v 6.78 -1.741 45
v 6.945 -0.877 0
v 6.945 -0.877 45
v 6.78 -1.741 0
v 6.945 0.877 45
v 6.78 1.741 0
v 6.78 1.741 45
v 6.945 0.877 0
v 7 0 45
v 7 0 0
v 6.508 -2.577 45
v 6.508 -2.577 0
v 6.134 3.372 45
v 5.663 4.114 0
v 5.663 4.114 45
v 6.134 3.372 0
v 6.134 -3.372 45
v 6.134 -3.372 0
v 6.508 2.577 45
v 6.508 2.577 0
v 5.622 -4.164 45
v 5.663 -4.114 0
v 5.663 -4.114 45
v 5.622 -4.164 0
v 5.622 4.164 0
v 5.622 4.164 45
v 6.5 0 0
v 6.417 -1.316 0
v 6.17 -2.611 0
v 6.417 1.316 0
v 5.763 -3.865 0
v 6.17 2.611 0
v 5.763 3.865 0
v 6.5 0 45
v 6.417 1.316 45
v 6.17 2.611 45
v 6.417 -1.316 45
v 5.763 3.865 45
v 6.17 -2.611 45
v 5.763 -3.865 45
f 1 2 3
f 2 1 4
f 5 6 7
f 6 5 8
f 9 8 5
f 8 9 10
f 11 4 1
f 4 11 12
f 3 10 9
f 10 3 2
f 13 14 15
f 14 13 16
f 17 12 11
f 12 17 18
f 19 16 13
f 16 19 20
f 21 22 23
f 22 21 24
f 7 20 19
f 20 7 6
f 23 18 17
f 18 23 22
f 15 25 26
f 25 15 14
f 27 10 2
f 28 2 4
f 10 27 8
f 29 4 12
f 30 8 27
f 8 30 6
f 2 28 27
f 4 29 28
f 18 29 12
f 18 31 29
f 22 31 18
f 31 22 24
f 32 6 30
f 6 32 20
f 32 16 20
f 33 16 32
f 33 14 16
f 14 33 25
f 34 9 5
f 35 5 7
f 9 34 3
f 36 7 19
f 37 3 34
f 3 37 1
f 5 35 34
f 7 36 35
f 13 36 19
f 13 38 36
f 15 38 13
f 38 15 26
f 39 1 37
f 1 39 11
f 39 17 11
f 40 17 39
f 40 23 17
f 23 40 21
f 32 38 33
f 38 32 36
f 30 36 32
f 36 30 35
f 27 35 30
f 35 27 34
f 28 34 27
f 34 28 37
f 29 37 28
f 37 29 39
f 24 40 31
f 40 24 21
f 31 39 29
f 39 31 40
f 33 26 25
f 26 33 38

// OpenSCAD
$fn = 50;


difference() {
	union() {
		cylinder(h = 45, r = 7.0000000000);
		translate(v = [-7.0000000000, 0, 0]) {
			cylinder(h = 45, r = 7.0000000000);
		}
	}
	union() {
		cylinder(h = 45, r = 3.2500000000);
		cylinder(h = 45, r = 1.8000000000);
		cylinder(h = 45, r = 1.8000000000);
		cylinder(h = 45, r = 1.8000000000);
		translate(v = [-11.5000000000, 0, 0]) {
			hull() {
				translate(v = [-3.7500000000, 0.0000000000, 0]) {
					cylinder(h = 45, r = 10.5000000000);
				}
				translate(v = [3.7500000000, 0.0000000000, 0]) {
					cylinder(h = 45, r = 10.5000000000);
				}
				translate(v = [-3.7500000000, -0.0000000000, 0]) {
					cylinder(h = 45, r = 10.5000000000);
				}
				translate(v = [3.7500000000, -0.0000000000, 0]) {
					cylinder(h = 45, r = 10.5000000000);
				}
			}
		}
		translate(v = [-4.0000000000, 0, 0.0000000000]) {
			cylinder(h = 45, r = 10.5000000000);
		}
	}
}
